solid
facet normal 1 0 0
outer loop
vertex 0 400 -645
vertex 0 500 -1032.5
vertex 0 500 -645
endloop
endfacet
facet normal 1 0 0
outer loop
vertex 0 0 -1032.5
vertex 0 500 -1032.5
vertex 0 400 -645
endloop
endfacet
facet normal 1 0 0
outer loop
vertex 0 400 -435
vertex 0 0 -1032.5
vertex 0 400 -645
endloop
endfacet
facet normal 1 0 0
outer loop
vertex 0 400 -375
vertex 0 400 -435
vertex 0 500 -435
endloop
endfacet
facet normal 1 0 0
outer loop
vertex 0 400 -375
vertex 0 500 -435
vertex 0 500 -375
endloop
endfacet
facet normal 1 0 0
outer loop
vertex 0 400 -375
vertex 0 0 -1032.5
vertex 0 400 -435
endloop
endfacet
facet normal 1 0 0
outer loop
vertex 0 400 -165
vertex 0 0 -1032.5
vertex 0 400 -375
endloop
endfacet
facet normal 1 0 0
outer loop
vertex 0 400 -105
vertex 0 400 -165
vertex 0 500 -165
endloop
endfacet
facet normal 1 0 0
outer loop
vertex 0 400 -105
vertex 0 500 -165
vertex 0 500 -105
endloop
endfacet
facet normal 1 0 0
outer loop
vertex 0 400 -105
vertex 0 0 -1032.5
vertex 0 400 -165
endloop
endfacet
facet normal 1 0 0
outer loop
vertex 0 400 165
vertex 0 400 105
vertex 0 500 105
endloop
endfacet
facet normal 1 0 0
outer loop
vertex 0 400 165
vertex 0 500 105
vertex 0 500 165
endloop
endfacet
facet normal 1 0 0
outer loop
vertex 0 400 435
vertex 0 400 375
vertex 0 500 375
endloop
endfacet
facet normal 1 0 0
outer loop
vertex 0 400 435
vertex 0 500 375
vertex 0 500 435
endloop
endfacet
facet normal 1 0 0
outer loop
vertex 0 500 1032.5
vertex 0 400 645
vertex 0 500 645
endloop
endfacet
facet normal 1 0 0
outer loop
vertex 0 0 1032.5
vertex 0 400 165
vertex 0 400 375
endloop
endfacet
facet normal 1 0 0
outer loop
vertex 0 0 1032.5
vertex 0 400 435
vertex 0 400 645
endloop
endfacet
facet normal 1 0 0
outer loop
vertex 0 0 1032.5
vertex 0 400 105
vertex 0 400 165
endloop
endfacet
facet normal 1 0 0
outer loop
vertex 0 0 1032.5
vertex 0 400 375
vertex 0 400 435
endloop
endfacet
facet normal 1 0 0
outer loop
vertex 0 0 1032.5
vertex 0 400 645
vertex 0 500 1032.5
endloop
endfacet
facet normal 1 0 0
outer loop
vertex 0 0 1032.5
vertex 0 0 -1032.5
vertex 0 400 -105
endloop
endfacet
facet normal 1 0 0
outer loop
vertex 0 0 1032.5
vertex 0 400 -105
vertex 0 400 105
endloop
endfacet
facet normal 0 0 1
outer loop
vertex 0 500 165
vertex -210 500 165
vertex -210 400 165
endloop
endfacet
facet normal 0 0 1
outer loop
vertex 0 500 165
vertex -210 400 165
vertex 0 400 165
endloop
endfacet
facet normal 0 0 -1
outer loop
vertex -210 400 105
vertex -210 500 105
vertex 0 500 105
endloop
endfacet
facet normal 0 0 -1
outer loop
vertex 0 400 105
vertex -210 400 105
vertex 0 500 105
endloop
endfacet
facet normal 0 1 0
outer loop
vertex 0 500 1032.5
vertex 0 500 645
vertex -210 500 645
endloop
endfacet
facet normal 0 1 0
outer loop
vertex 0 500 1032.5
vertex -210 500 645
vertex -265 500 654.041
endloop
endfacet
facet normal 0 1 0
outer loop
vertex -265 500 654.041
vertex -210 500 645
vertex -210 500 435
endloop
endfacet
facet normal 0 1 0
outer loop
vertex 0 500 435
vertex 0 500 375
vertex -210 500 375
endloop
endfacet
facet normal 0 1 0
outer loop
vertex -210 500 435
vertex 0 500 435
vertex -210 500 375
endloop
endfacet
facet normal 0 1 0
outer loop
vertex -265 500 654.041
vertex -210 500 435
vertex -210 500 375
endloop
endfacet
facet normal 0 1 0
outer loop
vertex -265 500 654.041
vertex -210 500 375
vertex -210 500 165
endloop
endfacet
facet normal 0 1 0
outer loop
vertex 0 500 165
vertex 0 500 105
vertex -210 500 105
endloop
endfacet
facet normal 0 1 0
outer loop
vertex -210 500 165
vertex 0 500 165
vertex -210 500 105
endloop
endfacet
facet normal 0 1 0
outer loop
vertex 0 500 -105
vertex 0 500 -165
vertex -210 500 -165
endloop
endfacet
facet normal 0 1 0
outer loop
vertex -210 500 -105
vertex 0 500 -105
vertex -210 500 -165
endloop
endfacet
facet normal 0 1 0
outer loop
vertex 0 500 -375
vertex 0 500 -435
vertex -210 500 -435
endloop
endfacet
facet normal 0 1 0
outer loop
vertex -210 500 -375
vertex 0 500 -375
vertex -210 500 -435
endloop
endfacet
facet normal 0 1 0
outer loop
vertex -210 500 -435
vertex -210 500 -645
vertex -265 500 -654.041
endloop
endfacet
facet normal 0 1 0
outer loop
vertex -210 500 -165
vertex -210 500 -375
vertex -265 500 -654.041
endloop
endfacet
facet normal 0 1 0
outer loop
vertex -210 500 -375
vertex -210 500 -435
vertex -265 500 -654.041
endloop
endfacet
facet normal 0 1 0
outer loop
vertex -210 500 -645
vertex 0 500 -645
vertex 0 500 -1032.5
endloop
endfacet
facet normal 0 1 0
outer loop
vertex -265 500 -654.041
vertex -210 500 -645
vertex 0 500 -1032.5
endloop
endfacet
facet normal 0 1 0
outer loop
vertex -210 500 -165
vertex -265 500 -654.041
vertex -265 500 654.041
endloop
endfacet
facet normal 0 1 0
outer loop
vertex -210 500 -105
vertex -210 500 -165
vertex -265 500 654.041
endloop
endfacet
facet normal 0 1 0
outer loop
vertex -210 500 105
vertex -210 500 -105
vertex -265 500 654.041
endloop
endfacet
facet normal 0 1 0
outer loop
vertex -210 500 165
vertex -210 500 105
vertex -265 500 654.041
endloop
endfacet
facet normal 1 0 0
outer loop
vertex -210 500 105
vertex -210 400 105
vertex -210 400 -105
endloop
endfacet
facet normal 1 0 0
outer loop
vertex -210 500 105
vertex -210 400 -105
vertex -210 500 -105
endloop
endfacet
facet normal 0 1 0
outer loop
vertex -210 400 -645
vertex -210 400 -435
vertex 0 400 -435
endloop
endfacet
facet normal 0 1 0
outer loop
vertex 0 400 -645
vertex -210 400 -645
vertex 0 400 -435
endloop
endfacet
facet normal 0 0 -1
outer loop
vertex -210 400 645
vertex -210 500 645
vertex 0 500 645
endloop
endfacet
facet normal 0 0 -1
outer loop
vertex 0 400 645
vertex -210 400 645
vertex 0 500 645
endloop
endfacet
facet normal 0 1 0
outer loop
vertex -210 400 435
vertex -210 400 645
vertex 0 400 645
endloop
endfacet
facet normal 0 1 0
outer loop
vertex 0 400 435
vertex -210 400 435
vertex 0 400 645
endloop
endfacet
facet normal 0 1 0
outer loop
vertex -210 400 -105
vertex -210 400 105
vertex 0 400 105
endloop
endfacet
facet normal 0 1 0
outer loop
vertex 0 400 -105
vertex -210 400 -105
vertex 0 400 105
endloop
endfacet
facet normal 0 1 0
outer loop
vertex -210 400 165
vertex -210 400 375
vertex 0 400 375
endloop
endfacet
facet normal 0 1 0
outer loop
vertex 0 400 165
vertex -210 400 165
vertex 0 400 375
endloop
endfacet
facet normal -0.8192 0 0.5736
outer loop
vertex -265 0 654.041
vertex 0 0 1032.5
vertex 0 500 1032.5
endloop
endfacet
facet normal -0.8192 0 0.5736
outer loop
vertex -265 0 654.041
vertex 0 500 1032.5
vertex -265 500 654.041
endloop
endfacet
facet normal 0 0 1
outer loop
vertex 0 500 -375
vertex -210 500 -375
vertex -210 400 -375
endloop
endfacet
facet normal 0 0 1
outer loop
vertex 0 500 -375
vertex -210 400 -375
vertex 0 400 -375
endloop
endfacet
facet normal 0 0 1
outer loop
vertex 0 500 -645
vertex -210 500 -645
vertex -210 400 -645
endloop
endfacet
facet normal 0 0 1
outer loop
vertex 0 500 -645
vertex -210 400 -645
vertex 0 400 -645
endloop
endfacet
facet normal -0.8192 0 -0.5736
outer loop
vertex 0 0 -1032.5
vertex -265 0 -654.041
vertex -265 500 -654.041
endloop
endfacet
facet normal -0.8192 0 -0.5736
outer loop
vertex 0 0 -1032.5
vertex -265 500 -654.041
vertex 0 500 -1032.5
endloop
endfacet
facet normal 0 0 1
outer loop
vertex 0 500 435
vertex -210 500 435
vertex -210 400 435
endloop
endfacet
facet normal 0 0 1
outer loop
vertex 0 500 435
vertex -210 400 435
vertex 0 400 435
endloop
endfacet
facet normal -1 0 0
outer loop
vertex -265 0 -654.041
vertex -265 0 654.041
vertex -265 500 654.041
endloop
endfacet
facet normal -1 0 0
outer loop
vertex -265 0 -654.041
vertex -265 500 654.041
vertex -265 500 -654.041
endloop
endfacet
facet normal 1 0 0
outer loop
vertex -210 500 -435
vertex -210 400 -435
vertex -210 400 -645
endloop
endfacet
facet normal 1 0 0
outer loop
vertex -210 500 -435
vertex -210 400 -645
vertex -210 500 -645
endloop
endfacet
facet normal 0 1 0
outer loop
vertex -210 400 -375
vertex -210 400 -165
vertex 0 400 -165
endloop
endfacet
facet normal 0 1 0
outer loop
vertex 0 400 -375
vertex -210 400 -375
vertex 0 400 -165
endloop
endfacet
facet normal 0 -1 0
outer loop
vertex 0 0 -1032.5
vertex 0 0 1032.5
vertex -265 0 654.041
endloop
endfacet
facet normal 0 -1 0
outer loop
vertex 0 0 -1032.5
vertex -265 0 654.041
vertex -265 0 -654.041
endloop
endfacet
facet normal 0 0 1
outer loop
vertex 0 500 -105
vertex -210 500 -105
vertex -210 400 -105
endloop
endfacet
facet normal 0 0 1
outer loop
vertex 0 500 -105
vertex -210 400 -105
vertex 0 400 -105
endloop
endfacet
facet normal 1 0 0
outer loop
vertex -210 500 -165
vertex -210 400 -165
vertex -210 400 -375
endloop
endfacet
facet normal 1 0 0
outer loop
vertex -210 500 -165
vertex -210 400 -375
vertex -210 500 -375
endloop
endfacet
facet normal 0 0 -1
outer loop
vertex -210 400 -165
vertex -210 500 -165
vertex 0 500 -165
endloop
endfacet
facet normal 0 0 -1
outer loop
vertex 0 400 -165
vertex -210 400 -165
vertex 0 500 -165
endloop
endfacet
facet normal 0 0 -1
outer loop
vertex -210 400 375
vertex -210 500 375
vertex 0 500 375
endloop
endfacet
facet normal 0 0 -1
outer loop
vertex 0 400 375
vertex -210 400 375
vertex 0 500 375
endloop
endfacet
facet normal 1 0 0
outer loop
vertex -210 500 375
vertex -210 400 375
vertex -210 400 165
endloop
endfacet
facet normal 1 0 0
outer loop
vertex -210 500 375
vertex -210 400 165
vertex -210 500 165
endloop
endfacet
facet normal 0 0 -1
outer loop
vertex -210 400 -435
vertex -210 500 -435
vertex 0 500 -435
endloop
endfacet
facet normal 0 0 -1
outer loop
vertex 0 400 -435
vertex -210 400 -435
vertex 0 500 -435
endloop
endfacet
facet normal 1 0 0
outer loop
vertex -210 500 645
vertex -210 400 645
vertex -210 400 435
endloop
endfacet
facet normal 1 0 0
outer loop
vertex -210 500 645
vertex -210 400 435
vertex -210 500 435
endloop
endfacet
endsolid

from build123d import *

# Parameters (mm, degrees)
EXTRUDE_1_DEPTH             = 500
SKETCH_2_W                  = 210
SKETCH_2_H                  = 100
CUT_EXTRUDE_1_DEPTH         = 105
PATTERN_LINEAR_1_COUNT      = 3
PATTERN_LINEAR_1_PITCH      = 270
PATTERN_LINEAR_1_COUNT_DIR2 = 3
PATTERN_LINEAR_1_PITCH_DIR2 = 270


with BuildPart() as part:
    # 草图1 → 凸台-拉伸1 (new body)
    with BuildSketch(Plane(origin=(0, 0, 0), x_dir=(1, 0, 0), z_dir=(0, 1, 0))):
        Polygon((0, 1032.5), (0, -1032.5), (-265, -654.040778213), (-265, 654.040778213), align=None)
    extrude(amount=EXTRUDE_1_DEPTH)

    # 草图2 → 切除-拉伸1 (cut, symmetric)
    with BuildSketch(Plane.XY):
        with Locations((-105, 450)):
            Rectangle(SKETCH_2_W, SKETCH_2_H)
    cut_extrude_1 = extrude(amount=CUT_EXTRUDE_1_DEPTH, both=True, mode=Mode.SUBTRACT)

    # 阵列(线性)1: Cut-Extrude 1 3 × 3
    with Locations(*[Vector(0, 0, 1) * (i * PATTERN_LINEAR_1_PITCH) + Vector(0, 0, -1) * (j * PATTERN_LINEAR_1_PITCH_DIR2) for i in range(PATTERN_LINEAR_1_COUNT) for j in range(PATTERN_LINEAR_1_COUNT_DIR2) if (i, j) != (0, 0)]):
        add(cut_extrude_1, mode=Mode.SUBTRACT)


solid = part.part
